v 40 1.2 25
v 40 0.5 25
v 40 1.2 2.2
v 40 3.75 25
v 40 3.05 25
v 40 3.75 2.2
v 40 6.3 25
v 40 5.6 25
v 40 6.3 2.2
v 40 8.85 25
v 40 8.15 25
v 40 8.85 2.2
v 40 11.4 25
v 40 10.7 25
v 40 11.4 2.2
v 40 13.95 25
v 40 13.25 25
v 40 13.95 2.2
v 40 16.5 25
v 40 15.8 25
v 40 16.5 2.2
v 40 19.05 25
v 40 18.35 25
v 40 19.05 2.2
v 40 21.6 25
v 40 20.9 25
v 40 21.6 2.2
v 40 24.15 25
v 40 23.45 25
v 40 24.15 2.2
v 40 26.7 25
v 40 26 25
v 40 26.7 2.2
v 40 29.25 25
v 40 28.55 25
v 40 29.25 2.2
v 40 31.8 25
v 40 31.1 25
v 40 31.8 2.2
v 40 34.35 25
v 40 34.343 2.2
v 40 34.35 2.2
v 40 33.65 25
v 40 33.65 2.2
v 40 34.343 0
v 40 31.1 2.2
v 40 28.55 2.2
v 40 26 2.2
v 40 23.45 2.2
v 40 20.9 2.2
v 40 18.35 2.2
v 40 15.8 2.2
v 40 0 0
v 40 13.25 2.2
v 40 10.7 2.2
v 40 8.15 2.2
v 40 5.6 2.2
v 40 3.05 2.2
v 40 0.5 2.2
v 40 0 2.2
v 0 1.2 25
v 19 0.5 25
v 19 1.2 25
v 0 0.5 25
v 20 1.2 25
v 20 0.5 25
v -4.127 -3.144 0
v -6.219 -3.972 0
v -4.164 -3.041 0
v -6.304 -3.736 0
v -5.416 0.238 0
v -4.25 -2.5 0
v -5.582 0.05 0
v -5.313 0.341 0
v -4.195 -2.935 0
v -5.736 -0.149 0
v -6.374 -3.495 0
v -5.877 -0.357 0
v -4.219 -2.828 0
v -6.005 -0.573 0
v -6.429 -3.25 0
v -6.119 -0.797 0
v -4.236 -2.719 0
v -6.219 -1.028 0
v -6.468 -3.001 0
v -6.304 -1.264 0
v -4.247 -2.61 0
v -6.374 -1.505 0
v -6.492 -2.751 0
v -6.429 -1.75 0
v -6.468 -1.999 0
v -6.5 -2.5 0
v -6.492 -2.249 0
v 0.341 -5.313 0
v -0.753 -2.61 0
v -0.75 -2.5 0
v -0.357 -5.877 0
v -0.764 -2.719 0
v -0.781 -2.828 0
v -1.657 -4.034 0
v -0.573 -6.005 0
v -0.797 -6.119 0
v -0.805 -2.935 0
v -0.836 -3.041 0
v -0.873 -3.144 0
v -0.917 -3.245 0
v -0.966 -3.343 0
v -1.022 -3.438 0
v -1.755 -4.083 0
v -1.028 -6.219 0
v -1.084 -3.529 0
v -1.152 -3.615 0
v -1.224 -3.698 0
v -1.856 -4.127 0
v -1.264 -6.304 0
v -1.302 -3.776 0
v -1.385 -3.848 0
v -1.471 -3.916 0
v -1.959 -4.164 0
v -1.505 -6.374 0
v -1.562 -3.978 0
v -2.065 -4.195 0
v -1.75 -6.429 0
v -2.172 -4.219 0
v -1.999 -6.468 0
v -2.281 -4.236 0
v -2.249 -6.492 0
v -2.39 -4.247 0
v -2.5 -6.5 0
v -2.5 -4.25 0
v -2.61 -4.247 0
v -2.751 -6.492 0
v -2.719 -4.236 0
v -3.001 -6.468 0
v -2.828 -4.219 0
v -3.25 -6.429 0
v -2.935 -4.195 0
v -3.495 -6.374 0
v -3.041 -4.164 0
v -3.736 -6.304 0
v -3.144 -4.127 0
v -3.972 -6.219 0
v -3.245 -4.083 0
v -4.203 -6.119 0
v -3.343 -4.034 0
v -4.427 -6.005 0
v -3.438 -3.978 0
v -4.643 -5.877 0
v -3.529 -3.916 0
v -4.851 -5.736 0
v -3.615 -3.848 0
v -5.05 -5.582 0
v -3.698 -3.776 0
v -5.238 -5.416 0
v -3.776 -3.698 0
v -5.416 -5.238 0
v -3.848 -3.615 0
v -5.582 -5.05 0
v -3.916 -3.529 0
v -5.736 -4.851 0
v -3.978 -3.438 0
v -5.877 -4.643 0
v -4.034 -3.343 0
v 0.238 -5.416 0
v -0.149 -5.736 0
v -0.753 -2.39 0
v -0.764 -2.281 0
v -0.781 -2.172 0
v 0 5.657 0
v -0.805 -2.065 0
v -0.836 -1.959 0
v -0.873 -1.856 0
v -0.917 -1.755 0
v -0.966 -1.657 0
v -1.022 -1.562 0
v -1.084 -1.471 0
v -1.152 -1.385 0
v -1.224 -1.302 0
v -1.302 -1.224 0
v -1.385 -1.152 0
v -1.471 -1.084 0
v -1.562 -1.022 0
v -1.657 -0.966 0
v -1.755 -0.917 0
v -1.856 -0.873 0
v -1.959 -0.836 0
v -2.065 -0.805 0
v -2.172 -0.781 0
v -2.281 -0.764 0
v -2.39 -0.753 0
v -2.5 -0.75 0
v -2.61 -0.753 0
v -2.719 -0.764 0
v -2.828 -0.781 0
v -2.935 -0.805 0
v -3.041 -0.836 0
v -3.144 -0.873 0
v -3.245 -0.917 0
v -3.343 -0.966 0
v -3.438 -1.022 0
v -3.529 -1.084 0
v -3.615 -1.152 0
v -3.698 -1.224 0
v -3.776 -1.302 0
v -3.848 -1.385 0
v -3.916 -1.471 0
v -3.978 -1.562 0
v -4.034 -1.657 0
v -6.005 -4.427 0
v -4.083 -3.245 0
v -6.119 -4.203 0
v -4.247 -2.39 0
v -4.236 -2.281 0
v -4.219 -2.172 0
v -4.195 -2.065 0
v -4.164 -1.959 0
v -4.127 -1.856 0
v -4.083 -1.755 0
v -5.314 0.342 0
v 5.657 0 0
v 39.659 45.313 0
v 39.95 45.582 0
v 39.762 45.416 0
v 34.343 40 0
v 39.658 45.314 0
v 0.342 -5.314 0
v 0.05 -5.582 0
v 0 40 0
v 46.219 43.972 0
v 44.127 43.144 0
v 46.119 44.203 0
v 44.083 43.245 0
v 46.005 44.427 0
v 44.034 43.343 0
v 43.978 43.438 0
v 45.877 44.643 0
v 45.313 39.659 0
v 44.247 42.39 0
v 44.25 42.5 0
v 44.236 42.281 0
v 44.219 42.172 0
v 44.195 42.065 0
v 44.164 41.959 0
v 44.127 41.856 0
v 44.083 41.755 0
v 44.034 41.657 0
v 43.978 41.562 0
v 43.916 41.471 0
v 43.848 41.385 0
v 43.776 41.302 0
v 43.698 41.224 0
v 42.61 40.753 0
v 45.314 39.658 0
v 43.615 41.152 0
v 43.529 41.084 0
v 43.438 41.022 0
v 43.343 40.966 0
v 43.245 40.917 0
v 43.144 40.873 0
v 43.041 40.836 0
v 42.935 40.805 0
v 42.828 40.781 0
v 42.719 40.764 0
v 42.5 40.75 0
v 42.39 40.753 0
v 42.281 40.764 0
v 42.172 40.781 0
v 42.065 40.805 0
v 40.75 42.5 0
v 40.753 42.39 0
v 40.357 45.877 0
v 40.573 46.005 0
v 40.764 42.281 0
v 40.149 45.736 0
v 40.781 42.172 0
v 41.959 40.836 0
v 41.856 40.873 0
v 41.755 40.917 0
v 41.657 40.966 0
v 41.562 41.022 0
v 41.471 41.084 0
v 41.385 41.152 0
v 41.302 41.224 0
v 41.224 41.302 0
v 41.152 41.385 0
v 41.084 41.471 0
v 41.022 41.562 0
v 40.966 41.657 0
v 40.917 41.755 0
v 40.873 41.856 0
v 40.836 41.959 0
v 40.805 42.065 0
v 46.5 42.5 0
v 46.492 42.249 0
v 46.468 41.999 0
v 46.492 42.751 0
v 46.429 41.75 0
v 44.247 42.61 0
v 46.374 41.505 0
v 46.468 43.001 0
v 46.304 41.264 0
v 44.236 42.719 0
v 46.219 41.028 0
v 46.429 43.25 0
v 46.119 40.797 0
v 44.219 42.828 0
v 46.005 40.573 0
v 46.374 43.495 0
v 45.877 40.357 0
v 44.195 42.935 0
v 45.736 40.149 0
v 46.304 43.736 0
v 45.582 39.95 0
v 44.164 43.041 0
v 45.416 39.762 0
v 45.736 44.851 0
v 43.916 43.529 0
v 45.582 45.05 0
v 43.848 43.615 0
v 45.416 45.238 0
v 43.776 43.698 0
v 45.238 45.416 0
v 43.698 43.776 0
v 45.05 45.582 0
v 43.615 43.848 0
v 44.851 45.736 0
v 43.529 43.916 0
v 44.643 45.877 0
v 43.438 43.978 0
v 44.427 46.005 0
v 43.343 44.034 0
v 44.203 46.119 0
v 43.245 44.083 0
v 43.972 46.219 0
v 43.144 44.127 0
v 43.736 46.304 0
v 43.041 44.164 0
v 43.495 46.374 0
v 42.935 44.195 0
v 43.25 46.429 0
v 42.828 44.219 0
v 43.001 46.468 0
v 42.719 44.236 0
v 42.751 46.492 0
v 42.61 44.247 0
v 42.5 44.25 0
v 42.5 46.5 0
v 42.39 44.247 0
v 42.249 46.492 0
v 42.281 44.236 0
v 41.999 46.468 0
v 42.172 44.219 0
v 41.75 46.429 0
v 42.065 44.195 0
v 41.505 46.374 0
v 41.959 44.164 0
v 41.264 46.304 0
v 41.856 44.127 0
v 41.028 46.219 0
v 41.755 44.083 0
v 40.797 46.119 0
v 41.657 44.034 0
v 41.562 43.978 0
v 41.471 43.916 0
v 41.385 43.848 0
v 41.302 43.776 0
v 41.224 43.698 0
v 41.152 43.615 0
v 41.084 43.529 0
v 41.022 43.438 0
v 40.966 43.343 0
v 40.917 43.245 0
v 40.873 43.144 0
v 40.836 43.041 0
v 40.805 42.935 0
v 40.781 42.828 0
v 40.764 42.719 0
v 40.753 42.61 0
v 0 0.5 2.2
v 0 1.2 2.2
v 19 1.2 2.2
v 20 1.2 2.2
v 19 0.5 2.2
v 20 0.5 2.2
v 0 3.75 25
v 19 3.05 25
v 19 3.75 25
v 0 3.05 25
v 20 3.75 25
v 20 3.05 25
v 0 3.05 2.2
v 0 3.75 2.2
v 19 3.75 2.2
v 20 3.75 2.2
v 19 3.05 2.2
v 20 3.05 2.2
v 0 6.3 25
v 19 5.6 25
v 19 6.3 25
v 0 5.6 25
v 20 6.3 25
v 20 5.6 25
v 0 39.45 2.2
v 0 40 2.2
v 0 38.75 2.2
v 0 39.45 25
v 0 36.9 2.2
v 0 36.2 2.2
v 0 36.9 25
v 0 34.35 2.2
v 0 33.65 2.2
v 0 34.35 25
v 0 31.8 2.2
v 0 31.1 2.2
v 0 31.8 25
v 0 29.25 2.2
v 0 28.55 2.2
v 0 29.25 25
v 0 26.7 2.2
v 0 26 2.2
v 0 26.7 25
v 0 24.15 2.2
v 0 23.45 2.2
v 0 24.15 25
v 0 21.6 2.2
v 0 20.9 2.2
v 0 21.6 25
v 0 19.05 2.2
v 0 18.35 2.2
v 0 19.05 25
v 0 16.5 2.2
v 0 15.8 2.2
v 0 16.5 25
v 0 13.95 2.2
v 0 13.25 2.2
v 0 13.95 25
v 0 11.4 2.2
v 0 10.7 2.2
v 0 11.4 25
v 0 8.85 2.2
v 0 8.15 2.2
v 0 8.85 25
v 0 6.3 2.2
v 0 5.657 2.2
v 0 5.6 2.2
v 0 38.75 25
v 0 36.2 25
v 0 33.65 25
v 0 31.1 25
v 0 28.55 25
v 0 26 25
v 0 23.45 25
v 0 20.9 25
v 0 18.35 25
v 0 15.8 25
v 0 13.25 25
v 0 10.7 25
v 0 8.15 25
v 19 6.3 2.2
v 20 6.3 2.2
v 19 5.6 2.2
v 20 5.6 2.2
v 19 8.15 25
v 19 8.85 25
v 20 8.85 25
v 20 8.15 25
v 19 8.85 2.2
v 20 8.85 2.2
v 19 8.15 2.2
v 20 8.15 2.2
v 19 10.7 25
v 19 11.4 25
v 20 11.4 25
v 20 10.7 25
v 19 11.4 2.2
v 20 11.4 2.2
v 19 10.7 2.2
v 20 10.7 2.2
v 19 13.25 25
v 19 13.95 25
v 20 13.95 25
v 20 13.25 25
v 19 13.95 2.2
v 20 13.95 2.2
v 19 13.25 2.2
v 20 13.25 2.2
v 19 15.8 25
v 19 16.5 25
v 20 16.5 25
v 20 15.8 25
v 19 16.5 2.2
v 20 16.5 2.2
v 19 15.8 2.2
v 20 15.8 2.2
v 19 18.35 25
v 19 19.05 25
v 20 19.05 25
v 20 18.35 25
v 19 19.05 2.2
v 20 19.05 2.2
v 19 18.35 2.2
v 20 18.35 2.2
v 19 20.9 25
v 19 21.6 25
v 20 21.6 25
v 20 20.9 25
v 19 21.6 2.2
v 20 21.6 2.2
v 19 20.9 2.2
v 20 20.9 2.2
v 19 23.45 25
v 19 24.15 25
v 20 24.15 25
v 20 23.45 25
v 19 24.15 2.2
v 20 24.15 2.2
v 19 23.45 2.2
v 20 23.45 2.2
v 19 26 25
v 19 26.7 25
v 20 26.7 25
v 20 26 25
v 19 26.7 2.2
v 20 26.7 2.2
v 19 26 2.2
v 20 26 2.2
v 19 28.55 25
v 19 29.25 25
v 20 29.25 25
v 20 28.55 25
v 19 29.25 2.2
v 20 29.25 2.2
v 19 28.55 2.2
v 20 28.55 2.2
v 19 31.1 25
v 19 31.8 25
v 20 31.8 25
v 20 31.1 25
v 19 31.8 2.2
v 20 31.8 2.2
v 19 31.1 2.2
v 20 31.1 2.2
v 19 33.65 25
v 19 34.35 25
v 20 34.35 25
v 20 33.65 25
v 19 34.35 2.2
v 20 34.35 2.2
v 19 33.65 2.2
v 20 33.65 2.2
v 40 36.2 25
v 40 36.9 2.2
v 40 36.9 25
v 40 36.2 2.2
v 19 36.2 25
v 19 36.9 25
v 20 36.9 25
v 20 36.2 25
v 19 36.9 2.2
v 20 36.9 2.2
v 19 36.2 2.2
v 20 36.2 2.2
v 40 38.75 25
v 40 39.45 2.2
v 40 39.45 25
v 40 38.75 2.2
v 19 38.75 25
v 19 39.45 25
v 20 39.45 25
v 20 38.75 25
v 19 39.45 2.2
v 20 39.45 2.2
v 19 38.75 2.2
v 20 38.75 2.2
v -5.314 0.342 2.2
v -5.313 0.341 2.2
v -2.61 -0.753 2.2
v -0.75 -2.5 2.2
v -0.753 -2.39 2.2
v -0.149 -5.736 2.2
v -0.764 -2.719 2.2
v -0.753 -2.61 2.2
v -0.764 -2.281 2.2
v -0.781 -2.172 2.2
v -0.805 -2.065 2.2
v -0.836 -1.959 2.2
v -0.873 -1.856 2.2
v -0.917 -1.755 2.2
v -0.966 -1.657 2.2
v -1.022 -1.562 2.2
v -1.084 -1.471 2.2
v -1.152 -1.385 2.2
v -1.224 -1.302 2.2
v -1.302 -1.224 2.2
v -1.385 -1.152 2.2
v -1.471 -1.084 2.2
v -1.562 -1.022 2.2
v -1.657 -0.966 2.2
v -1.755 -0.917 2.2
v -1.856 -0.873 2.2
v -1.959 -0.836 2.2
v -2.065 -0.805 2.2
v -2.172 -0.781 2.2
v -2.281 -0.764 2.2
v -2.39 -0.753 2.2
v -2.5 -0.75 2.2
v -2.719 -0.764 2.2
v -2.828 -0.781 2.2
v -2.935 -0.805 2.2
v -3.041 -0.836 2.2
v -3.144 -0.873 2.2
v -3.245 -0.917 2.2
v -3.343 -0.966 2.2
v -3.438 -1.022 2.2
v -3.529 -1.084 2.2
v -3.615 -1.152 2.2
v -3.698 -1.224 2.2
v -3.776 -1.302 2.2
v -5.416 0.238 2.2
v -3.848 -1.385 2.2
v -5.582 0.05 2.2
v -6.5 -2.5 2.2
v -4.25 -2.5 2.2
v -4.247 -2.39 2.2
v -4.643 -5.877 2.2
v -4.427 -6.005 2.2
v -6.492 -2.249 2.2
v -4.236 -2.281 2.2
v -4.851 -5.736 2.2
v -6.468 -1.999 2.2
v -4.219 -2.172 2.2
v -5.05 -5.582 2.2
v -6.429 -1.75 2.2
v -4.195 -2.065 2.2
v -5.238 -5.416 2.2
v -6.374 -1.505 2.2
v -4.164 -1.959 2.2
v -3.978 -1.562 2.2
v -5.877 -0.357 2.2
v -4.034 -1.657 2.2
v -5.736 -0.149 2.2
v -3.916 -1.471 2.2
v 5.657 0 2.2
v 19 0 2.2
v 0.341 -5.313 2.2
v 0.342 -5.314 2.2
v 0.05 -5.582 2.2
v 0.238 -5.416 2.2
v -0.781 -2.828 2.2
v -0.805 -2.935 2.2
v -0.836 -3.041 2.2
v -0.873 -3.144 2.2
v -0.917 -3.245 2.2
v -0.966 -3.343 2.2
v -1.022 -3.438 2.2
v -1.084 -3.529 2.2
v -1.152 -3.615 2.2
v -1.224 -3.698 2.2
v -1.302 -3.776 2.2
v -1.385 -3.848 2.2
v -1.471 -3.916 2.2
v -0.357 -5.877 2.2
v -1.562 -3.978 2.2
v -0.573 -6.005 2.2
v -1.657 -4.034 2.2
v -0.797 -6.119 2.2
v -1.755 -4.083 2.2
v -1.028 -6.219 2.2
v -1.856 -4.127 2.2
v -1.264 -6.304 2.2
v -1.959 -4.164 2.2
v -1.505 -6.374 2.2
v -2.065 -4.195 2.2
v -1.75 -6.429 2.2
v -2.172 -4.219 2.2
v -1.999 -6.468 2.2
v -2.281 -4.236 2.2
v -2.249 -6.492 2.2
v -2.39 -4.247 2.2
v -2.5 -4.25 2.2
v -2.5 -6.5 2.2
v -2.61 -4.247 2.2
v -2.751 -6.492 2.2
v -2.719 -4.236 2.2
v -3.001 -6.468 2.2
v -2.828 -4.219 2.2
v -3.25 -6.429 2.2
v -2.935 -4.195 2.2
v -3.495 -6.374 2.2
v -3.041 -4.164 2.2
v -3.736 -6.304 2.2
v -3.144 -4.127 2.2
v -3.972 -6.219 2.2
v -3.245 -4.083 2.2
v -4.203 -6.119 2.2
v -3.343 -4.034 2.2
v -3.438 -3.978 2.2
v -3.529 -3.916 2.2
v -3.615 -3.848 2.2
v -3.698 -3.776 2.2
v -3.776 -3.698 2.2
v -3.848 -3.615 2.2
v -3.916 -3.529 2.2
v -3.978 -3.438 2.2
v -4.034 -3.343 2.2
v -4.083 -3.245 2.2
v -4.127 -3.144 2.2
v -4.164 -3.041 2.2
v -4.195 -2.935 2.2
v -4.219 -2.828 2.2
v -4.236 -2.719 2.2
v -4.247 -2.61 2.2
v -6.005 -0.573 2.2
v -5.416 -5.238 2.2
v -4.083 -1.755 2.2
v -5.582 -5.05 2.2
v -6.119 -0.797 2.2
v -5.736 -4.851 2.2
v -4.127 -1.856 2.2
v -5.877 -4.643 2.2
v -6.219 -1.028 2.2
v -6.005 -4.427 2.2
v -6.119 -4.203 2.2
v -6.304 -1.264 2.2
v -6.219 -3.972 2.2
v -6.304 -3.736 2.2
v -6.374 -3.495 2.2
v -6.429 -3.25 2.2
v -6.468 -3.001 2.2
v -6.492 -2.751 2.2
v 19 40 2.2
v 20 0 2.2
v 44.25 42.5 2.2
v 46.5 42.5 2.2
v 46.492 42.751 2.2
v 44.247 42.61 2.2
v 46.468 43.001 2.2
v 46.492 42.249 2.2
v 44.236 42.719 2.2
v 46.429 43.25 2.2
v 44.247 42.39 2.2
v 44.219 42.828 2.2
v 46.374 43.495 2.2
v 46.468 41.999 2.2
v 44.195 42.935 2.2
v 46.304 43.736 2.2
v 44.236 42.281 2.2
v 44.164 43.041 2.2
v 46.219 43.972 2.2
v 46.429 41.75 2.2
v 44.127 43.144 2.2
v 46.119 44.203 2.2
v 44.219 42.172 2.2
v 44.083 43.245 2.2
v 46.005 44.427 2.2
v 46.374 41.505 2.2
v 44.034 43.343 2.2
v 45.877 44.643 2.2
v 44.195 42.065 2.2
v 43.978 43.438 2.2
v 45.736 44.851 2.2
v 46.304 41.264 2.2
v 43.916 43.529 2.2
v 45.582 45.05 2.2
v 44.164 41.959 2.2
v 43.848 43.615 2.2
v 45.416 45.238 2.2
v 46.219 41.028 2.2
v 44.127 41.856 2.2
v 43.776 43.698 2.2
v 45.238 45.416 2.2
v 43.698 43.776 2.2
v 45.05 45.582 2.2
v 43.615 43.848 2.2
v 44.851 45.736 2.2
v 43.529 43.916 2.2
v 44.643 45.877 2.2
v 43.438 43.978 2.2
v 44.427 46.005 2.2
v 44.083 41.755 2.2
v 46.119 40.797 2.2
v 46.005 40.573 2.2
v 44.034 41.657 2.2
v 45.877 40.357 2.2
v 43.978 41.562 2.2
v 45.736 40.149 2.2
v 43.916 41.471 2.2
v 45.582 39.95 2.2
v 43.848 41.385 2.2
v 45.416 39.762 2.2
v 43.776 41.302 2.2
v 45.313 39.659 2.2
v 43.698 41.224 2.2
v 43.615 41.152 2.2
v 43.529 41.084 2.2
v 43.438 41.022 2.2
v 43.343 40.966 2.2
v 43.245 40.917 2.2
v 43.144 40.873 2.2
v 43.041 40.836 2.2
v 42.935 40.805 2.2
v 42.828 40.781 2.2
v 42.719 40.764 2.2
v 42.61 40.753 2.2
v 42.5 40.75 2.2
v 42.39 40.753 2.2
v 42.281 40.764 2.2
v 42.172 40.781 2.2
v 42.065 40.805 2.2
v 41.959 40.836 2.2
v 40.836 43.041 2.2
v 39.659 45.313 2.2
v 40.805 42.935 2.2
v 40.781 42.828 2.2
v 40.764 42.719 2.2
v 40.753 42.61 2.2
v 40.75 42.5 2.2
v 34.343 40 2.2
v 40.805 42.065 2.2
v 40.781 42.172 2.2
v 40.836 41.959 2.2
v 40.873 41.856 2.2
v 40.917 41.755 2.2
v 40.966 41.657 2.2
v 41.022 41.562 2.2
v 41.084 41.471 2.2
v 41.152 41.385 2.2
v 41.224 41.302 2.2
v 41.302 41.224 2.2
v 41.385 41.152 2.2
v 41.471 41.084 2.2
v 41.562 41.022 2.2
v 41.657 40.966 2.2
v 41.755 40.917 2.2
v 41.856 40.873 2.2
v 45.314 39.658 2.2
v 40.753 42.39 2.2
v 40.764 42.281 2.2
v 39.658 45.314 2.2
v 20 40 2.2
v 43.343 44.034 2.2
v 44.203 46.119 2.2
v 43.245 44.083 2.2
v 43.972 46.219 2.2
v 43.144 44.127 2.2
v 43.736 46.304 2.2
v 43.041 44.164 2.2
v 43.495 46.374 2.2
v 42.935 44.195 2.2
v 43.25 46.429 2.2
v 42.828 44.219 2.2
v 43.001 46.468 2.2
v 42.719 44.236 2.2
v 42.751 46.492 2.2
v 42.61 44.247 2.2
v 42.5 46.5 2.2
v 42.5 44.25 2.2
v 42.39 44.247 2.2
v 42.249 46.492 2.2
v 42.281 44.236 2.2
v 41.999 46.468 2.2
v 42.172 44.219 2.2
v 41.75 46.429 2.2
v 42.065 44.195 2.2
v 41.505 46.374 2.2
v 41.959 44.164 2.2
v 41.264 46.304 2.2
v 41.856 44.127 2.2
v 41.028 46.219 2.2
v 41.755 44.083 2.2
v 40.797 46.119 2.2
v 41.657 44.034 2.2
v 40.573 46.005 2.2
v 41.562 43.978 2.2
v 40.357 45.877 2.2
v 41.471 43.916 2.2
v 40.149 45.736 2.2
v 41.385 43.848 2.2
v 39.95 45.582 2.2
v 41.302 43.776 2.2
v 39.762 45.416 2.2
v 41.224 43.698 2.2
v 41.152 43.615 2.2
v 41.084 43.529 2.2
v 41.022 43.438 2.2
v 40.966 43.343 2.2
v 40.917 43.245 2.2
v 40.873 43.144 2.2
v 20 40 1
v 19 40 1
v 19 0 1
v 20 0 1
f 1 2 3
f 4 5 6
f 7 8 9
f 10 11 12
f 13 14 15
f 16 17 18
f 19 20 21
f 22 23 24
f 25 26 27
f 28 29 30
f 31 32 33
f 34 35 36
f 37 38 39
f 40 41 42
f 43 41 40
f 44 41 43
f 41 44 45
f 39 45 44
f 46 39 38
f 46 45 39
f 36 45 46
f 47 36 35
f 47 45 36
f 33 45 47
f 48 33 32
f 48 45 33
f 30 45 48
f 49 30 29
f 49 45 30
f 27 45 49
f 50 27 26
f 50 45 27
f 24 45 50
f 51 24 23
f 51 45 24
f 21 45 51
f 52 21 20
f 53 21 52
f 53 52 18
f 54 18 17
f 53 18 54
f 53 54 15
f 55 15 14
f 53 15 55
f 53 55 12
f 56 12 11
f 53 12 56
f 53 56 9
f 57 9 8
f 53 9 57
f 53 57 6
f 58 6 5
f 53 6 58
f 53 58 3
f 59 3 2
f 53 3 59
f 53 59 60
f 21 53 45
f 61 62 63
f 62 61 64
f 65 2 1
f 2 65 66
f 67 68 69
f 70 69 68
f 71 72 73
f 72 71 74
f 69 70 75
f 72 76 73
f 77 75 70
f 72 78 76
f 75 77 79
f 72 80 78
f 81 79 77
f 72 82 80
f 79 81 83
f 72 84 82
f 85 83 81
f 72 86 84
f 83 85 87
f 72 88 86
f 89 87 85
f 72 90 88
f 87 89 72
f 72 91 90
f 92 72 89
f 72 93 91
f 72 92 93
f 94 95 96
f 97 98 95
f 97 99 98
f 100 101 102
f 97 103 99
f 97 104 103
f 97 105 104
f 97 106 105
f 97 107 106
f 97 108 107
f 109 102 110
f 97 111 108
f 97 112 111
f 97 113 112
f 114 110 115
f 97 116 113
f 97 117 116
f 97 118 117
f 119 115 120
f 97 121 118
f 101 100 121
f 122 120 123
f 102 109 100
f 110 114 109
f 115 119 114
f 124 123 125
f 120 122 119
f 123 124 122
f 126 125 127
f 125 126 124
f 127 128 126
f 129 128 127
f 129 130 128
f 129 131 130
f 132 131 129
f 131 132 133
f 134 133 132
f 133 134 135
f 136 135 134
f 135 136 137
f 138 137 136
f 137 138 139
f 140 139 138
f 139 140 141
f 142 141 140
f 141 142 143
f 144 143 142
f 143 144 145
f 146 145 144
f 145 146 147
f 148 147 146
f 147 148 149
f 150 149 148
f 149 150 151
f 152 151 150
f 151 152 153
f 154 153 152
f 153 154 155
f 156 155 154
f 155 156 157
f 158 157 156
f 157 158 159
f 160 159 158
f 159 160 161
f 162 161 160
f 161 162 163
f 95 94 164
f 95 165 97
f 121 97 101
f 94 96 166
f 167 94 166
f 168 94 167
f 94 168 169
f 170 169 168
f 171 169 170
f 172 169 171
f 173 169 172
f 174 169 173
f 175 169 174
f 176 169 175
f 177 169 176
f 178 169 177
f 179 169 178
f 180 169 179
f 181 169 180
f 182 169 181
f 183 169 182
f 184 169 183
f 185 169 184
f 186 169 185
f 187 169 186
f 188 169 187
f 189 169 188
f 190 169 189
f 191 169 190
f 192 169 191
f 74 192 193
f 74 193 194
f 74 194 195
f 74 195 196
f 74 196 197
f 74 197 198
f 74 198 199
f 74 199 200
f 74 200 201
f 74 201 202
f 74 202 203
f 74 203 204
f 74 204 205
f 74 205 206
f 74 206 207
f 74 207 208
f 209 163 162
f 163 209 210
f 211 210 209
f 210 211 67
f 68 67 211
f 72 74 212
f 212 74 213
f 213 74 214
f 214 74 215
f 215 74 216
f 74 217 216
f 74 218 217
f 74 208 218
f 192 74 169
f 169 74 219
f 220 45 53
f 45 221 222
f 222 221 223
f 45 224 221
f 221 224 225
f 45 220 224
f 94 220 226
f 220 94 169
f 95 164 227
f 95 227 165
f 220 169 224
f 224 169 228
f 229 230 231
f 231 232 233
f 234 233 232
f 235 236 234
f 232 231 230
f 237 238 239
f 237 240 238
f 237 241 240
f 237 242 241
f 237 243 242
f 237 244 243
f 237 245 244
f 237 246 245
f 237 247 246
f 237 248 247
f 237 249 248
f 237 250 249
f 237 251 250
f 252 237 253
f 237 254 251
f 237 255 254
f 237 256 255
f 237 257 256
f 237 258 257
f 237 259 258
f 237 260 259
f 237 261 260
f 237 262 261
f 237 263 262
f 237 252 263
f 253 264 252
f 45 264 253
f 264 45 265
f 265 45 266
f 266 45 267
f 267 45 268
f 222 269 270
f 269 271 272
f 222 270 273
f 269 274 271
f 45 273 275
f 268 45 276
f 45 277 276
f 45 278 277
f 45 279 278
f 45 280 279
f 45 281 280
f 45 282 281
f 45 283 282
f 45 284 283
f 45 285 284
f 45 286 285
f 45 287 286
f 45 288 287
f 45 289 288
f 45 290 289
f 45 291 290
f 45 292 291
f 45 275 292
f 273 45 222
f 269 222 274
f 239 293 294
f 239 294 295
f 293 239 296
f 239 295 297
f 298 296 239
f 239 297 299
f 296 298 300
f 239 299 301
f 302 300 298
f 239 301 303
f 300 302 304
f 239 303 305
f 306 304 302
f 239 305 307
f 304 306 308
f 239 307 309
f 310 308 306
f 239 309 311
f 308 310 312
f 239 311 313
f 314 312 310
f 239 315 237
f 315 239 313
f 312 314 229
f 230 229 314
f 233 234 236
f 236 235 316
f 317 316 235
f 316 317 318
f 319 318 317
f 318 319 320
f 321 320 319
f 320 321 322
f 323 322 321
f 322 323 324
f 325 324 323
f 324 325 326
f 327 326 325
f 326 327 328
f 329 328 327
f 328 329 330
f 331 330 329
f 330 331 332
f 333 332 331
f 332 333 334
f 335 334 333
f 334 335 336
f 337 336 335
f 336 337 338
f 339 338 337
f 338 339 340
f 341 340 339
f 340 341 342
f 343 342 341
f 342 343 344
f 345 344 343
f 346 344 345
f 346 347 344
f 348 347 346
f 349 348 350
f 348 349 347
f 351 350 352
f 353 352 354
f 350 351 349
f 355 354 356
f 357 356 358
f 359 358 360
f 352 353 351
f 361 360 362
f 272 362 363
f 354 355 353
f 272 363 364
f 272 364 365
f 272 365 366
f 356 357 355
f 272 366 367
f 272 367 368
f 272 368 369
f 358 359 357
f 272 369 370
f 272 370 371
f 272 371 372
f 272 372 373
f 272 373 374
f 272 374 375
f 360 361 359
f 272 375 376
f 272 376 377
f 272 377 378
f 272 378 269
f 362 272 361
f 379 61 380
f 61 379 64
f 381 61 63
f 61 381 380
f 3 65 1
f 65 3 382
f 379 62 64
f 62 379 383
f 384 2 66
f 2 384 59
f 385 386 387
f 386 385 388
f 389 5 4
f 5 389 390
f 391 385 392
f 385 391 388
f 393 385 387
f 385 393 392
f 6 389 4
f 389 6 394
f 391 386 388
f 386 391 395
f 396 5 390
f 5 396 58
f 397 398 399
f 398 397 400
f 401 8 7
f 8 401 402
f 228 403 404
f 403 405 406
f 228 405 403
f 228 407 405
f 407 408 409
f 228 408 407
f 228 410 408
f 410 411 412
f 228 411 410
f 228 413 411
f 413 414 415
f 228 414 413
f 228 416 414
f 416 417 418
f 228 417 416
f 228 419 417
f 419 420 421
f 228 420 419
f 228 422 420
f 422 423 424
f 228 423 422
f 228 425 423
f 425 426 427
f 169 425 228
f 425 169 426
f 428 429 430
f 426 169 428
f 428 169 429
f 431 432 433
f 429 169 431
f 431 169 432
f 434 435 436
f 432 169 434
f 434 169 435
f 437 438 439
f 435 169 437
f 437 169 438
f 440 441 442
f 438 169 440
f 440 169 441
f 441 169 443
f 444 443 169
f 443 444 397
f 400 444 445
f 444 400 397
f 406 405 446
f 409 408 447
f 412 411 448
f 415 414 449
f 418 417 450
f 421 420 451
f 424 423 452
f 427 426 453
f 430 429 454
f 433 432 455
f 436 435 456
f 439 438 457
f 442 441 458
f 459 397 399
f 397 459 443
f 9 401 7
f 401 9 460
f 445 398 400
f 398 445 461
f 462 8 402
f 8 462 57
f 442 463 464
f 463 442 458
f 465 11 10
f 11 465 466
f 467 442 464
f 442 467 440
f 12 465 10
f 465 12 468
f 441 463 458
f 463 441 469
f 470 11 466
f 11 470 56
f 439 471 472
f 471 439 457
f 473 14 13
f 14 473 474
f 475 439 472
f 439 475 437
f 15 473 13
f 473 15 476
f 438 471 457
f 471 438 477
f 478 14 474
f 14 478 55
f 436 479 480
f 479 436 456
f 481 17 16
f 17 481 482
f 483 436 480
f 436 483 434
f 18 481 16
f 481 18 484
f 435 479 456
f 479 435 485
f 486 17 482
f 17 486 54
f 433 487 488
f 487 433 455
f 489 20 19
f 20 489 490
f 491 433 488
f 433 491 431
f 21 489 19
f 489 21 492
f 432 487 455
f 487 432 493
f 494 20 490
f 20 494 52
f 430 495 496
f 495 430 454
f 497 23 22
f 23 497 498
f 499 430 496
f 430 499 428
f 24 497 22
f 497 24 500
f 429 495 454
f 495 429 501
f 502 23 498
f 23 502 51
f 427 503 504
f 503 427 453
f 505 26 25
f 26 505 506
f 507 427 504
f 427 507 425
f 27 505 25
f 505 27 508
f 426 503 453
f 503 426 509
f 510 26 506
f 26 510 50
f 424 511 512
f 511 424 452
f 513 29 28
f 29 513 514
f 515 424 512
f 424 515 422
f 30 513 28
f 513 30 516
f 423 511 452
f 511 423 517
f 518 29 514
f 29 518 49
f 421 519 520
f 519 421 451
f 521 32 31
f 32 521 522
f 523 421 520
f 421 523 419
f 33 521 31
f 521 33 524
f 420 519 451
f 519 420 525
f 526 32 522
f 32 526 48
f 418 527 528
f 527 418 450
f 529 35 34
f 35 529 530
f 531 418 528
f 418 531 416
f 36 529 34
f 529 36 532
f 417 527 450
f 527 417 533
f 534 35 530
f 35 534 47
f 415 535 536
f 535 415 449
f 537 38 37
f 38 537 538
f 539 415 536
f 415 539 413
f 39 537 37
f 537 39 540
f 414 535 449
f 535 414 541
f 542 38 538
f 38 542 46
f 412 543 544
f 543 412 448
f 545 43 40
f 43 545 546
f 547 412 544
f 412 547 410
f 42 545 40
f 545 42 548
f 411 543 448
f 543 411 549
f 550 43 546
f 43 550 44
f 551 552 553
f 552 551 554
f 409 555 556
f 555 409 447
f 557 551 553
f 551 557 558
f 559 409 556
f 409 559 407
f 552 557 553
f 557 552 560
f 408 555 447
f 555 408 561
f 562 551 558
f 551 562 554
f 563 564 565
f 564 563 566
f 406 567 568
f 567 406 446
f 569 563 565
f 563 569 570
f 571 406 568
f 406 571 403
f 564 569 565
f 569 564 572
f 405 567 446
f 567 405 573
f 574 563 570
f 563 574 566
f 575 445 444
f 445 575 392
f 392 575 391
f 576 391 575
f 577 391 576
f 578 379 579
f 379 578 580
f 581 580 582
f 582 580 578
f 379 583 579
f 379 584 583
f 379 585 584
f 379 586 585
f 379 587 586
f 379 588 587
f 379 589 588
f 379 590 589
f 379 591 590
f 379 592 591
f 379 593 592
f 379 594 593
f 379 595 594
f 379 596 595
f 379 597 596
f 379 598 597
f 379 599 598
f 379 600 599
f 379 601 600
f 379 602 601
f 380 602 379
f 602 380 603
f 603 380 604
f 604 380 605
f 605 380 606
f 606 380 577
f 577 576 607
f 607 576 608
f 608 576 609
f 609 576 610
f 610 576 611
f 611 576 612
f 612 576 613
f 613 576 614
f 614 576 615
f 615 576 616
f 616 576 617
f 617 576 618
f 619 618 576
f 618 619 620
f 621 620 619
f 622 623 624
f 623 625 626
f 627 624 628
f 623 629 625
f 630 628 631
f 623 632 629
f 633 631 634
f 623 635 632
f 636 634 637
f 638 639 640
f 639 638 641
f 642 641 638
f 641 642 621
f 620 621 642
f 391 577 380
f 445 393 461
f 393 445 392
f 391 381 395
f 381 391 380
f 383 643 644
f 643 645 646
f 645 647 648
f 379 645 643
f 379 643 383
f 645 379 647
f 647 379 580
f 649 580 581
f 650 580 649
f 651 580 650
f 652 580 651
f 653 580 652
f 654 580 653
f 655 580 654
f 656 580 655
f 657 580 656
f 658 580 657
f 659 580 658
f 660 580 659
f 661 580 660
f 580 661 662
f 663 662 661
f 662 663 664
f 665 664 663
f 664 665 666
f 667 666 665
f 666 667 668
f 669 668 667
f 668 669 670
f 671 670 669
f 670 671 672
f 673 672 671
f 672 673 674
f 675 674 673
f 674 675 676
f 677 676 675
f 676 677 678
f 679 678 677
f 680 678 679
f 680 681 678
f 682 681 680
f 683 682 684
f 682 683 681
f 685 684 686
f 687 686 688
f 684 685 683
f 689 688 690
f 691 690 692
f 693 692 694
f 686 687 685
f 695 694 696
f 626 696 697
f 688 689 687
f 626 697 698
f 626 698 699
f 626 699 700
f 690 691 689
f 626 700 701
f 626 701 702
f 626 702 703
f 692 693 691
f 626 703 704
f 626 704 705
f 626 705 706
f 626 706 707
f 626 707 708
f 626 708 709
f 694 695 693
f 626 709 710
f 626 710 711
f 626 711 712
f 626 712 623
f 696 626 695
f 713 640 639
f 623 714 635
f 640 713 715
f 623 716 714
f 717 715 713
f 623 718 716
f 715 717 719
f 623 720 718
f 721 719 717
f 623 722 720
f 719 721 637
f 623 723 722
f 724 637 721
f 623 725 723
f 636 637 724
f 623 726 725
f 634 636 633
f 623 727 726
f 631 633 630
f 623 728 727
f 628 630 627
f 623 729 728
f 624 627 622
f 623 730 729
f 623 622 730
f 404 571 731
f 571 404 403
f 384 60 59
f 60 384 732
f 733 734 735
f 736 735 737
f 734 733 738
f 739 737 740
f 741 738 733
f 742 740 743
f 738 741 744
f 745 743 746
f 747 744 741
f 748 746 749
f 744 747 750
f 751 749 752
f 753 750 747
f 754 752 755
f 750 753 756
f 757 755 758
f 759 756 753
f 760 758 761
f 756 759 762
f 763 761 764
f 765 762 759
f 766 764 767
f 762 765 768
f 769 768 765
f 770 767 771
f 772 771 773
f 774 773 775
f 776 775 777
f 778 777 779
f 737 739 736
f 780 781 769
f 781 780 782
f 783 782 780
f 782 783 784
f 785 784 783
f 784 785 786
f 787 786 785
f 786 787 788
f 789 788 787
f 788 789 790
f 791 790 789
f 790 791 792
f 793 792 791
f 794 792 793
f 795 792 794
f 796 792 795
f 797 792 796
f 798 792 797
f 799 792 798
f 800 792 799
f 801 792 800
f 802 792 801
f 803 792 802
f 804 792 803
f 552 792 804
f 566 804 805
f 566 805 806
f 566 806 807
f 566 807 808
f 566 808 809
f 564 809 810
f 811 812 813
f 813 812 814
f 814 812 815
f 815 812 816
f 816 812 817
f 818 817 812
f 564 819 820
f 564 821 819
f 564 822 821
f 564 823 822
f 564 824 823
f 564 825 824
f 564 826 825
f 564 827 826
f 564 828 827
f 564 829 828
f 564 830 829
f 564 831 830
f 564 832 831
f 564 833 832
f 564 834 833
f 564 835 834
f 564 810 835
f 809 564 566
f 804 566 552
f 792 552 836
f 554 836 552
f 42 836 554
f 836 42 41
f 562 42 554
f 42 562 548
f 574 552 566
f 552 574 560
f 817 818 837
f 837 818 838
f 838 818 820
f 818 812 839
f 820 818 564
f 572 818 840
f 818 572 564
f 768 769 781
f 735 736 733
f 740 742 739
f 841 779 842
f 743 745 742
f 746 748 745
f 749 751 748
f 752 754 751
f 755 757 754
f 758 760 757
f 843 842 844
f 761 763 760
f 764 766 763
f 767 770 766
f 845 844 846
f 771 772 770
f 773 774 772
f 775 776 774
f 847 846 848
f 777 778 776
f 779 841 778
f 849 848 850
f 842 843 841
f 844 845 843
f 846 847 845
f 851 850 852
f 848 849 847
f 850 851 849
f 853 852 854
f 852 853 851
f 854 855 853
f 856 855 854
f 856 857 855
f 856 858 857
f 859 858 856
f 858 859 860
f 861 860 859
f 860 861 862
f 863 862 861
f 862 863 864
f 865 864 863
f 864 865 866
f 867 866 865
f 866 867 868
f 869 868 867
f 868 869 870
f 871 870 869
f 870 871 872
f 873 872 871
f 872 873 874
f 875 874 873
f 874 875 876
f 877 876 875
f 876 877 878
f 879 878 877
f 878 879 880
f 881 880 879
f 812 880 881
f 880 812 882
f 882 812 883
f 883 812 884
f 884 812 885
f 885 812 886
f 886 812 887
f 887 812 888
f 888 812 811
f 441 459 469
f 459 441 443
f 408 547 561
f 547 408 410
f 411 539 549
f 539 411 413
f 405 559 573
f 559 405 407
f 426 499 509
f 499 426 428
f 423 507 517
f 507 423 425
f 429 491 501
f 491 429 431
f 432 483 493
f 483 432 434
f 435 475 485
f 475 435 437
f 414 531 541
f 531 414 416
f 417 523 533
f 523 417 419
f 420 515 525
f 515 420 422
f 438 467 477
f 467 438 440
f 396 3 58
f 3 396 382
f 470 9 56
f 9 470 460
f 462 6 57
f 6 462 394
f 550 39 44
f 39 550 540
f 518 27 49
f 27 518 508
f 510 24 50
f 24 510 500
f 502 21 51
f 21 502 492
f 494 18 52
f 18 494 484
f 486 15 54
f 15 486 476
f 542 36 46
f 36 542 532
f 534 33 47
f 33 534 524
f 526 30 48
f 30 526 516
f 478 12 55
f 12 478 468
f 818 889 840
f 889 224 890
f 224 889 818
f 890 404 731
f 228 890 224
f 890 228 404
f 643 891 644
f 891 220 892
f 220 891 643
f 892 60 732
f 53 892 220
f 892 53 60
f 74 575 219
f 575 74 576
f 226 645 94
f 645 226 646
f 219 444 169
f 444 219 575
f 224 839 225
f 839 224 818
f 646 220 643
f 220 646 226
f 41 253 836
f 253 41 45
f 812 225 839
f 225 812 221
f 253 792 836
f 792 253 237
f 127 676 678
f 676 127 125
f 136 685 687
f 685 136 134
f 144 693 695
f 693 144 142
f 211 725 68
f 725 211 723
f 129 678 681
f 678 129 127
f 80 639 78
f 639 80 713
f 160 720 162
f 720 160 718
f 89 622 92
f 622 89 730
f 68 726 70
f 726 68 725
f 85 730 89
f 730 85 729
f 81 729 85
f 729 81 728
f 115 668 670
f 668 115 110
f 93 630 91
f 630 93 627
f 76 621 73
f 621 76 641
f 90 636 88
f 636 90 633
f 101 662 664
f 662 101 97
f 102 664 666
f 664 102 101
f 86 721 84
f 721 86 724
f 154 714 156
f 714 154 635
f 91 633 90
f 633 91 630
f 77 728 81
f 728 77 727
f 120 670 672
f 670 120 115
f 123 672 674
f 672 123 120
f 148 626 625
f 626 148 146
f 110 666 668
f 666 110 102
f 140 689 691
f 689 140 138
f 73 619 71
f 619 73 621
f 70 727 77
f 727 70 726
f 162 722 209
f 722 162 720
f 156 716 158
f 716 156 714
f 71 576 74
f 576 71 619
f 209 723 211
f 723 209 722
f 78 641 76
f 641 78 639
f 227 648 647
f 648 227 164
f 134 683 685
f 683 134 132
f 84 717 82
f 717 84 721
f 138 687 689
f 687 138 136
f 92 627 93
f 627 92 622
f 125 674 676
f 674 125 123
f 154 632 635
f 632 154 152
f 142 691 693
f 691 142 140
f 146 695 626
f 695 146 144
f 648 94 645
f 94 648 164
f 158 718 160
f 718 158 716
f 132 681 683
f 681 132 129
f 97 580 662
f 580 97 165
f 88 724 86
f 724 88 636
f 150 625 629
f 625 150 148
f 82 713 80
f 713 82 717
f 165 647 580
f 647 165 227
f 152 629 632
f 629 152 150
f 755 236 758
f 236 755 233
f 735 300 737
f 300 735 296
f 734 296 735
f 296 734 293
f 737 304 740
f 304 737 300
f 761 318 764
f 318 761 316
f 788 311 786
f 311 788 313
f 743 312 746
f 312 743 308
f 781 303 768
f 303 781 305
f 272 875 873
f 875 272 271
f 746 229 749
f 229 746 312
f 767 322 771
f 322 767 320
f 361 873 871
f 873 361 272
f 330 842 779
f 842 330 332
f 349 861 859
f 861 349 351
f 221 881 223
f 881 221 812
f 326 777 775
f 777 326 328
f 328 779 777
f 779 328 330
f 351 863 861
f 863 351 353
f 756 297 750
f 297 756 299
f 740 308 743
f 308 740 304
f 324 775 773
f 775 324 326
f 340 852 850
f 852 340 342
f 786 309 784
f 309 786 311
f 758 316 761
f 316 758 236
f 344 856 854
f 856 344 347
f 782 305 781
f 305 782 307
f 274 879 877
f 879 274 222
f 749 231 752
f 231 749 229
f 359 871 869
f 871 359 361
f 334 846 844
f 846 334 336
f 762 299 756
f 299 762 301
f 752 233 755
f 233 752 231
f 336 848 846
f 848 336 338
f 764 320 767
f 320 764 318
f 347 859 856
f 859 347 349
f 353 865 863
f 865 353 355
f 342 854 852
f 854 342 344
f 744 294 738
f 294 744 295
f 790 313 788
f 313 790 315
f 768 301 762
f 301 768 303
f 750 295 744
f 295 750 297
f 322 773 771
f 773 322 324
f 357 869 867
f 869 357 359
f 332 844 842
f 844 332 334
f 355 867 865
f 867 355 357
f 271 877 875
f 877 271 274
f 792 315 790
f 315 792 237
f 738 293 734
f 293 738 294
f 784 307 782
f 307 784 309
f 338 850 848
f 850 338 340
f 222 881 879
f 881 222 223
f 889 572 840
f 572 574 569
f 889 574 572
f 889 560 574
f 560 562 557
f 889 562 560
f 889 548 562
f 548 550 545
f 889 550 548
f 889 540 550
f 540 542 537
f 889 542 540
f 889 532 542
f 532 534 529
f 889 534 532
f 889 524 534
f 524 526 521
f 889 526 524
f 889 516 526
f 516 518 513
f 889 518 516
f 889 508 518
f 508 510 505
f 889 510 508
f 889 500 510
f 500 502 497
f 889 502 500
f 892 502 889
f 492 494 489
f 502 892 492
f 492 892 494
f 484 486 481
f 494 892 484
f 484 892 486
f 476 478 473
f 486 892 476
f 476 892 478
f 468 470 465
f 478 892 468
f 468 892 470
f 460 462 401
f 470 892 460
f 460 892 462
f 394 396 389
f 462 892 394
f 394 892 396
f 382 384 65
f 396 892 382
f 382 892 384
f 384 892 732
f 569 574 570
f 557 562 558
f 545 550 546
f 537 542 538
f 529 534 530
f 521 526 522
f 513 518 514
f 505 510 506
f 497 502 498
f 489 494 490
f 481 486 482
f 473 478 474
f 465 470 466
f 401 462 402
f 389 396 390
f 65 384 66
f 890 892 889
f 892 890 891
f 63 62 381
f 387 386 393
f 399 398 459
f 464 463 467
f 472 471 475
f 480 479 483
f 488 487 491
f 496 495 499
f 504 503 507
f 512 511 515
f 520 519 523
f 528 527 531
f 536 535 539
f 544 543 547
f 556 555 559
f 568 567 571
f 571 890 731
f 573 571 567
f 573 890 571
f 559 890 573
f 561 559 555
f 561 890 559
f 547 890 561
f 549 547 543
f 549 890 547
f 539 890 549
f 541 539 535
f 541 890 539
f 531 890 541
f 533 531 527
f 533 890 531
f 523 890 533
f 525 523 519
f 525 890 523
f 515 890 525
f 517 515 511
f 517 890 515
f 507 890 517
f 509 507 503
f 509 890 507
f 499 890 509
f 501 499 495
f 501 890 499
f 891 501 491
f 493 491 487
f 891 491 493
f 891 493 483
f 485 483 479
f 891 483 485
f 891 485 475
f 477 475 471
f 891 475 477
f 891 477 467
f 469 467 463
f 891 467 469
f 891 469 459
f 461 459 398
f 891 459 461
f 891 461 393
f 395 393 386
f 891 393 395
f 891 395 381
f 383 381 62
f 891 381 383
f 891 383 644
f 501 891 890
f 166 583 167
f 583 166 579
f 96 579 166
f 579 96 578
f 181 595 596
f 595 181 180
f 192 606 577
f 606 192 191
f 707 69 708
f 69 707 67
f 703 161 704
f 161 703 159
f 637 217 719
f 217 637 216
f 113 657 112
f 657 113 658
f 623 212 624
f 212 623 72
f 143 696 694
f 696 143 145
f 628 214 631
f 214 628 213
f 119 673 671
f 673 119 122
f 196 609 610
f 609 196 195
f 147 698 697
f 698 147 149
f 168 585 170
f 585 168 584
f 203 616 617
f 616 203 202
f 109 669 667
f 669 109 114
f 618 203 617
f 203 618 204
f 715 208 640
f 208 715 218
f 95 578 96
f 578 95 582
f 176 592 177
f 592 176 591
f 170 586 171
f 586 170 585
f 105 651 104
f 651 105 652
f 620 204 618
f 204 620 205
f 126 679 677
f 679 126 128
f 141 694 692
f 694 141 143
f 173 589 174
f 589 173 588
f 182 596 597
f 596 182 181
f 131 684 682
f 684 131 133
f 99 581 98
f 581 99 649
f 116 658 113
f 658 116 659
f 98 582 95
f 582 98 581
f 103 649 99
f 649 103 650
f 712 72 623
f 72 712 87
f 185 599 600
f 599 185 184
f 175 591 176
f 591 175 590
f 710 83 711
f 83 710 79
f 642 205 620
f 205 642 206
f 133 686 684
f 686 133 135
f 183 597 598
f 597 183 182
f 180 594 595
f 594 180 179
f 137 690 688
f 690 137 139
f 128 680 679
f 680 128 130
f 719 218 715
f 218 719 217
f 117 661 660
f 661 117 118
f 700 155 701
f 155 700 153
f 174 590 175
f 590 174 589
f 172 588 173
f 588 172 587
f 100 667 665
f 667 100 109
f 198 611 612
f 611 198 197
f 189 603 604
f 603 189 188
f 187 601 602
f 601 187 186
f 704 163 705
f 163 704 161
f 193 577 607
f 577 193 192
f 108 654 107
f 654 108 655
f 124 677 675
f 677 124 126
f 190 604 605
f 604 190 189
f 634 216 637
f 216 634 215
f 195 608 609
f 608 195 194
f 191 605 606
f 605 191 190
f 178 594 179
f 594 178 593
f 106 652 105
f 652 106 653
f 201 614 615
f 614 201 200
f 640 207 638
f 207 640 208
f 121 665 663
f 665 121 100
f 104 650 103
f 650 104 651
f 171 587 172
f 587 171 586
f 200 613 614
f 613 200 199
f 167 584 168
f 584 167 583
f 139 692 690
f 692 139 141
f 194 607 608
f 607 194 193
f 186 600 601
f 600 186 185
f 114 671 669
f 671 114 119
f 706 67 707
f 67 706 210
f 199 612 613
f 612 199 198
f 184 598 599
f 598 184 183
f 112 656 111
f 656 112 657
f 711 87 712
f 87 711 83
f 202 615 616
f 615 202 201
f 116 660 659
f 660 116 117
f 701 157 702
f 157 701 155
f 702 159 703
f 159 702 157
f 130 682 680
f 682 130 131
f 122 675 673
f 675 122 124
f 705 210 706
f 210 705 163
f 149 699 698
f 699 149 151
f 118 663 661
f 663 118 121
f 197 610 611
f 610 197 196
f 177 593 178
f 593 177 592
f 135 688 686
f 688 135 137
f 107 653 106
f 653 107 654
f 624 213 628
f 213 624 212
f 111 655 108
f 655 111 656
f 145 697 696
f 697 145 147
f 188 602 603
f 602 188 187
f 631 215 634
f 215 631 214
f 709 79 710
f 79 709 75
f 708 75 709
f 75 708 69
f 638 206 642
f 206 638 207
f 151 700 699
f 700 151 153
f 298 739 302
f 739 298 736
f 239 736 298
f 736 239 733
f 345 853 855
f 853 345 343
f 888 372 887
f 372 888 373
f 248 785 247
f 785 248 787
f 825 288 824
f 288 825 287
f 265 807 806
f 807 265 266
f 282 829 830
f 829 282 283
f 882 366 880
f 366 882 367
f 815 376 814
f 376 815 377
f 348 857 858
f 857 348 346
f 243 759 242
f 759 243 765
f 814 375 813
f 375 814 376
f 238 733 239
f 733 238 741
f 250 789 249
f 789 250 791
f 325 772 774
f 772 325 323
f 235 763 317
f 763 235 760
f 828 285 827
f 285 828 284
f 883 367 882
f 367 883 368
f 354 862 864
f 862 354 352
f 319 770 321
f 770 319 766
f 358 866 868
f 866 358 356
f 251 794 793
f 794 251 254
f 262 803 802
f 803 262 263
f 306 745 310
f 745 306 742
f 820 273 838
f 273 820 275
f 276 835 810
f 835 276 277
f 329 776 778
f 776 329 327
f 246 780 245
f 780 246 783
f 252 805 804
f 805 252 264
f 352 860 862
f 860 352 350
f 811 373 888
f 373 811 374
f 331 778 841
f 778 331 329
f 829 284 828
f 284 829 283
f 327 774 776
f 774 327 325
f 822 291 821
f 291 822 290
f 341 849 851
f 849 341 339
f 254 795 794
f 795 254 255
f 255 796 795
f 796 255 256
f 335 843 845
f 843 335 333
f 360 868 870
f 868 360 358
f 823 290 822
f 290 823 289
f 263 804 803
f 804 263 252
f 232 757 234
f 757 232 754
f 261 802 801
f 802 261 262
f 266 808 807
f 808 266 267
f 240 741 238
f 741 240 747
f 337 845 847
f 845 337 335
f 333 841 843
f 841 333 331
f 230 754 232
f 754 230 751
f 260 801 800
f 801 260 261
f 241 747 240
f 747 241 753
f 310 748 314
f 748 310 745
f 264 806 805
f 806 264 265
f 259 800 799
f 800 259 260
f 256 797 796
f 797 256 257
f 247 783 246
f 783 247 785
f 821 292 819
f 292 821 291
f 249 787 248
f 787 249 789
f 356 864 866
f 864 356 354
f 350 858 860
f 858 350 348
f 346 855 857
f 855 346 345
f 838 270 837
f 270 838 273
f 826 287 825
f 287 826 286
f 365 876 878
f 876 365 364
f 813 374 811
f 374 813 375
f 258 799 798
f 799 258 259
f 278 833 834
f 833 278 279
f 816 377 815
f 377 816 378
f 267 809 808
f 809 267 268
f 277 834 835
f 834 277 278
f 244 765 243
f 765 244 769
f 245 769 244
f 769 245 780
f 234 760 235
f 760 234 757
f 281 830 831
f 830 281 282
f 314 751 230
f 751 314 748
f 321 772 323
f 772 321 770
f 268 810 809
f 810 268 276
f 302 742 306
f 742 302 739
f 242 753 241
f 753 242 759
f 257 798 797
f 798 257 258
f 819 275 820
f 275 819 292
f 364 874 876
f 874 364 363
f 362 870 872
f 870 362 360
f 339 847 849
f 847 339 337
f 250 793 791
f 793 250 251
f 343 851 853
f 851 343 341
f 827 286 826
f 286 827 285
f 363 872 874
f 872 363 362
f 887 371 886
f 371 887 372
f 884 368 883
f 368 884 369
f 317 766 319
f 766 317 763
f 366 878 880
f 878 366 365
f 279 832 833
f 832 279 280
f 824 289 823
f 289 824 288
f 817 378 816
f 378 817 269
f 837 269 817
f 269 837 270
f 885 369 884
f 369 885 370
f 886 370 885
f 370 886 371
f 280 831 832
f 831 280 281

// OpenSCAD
$fn=100;
a=8.1;
h=3.5;
color("#31aee1") difference() {
    union() {
        cube([40, 40, 2.2]);

        for (i=[0: 15]) {
            translate([0, 0.5+i*2.55, 0]) cube([40, 0.7, 25]);
        }
        translate([20, 20, 1.1]) rotate([0, 0, 45]) cube([71.6-8, 8, 2.2], center=true);
        translate([-2.5, -2.5, 1.1]) cylinder(d=8, h=2.2, center=true);
        translate([2.5+40, 2.5+40, 1.1]) cylinder(d=8, h=2.2, center=true);
    }
    translate([20-1, 0, 1]) cube([1, 40, 25]);
    translate([-2.5, -2.5, 1.0]) cylinder(d=3.5, h=2.5, center=true);
    translate([2.5+40, 2.5+40, 1.0]) cylinder(d=3.5, h=2.5, center=true);
}
